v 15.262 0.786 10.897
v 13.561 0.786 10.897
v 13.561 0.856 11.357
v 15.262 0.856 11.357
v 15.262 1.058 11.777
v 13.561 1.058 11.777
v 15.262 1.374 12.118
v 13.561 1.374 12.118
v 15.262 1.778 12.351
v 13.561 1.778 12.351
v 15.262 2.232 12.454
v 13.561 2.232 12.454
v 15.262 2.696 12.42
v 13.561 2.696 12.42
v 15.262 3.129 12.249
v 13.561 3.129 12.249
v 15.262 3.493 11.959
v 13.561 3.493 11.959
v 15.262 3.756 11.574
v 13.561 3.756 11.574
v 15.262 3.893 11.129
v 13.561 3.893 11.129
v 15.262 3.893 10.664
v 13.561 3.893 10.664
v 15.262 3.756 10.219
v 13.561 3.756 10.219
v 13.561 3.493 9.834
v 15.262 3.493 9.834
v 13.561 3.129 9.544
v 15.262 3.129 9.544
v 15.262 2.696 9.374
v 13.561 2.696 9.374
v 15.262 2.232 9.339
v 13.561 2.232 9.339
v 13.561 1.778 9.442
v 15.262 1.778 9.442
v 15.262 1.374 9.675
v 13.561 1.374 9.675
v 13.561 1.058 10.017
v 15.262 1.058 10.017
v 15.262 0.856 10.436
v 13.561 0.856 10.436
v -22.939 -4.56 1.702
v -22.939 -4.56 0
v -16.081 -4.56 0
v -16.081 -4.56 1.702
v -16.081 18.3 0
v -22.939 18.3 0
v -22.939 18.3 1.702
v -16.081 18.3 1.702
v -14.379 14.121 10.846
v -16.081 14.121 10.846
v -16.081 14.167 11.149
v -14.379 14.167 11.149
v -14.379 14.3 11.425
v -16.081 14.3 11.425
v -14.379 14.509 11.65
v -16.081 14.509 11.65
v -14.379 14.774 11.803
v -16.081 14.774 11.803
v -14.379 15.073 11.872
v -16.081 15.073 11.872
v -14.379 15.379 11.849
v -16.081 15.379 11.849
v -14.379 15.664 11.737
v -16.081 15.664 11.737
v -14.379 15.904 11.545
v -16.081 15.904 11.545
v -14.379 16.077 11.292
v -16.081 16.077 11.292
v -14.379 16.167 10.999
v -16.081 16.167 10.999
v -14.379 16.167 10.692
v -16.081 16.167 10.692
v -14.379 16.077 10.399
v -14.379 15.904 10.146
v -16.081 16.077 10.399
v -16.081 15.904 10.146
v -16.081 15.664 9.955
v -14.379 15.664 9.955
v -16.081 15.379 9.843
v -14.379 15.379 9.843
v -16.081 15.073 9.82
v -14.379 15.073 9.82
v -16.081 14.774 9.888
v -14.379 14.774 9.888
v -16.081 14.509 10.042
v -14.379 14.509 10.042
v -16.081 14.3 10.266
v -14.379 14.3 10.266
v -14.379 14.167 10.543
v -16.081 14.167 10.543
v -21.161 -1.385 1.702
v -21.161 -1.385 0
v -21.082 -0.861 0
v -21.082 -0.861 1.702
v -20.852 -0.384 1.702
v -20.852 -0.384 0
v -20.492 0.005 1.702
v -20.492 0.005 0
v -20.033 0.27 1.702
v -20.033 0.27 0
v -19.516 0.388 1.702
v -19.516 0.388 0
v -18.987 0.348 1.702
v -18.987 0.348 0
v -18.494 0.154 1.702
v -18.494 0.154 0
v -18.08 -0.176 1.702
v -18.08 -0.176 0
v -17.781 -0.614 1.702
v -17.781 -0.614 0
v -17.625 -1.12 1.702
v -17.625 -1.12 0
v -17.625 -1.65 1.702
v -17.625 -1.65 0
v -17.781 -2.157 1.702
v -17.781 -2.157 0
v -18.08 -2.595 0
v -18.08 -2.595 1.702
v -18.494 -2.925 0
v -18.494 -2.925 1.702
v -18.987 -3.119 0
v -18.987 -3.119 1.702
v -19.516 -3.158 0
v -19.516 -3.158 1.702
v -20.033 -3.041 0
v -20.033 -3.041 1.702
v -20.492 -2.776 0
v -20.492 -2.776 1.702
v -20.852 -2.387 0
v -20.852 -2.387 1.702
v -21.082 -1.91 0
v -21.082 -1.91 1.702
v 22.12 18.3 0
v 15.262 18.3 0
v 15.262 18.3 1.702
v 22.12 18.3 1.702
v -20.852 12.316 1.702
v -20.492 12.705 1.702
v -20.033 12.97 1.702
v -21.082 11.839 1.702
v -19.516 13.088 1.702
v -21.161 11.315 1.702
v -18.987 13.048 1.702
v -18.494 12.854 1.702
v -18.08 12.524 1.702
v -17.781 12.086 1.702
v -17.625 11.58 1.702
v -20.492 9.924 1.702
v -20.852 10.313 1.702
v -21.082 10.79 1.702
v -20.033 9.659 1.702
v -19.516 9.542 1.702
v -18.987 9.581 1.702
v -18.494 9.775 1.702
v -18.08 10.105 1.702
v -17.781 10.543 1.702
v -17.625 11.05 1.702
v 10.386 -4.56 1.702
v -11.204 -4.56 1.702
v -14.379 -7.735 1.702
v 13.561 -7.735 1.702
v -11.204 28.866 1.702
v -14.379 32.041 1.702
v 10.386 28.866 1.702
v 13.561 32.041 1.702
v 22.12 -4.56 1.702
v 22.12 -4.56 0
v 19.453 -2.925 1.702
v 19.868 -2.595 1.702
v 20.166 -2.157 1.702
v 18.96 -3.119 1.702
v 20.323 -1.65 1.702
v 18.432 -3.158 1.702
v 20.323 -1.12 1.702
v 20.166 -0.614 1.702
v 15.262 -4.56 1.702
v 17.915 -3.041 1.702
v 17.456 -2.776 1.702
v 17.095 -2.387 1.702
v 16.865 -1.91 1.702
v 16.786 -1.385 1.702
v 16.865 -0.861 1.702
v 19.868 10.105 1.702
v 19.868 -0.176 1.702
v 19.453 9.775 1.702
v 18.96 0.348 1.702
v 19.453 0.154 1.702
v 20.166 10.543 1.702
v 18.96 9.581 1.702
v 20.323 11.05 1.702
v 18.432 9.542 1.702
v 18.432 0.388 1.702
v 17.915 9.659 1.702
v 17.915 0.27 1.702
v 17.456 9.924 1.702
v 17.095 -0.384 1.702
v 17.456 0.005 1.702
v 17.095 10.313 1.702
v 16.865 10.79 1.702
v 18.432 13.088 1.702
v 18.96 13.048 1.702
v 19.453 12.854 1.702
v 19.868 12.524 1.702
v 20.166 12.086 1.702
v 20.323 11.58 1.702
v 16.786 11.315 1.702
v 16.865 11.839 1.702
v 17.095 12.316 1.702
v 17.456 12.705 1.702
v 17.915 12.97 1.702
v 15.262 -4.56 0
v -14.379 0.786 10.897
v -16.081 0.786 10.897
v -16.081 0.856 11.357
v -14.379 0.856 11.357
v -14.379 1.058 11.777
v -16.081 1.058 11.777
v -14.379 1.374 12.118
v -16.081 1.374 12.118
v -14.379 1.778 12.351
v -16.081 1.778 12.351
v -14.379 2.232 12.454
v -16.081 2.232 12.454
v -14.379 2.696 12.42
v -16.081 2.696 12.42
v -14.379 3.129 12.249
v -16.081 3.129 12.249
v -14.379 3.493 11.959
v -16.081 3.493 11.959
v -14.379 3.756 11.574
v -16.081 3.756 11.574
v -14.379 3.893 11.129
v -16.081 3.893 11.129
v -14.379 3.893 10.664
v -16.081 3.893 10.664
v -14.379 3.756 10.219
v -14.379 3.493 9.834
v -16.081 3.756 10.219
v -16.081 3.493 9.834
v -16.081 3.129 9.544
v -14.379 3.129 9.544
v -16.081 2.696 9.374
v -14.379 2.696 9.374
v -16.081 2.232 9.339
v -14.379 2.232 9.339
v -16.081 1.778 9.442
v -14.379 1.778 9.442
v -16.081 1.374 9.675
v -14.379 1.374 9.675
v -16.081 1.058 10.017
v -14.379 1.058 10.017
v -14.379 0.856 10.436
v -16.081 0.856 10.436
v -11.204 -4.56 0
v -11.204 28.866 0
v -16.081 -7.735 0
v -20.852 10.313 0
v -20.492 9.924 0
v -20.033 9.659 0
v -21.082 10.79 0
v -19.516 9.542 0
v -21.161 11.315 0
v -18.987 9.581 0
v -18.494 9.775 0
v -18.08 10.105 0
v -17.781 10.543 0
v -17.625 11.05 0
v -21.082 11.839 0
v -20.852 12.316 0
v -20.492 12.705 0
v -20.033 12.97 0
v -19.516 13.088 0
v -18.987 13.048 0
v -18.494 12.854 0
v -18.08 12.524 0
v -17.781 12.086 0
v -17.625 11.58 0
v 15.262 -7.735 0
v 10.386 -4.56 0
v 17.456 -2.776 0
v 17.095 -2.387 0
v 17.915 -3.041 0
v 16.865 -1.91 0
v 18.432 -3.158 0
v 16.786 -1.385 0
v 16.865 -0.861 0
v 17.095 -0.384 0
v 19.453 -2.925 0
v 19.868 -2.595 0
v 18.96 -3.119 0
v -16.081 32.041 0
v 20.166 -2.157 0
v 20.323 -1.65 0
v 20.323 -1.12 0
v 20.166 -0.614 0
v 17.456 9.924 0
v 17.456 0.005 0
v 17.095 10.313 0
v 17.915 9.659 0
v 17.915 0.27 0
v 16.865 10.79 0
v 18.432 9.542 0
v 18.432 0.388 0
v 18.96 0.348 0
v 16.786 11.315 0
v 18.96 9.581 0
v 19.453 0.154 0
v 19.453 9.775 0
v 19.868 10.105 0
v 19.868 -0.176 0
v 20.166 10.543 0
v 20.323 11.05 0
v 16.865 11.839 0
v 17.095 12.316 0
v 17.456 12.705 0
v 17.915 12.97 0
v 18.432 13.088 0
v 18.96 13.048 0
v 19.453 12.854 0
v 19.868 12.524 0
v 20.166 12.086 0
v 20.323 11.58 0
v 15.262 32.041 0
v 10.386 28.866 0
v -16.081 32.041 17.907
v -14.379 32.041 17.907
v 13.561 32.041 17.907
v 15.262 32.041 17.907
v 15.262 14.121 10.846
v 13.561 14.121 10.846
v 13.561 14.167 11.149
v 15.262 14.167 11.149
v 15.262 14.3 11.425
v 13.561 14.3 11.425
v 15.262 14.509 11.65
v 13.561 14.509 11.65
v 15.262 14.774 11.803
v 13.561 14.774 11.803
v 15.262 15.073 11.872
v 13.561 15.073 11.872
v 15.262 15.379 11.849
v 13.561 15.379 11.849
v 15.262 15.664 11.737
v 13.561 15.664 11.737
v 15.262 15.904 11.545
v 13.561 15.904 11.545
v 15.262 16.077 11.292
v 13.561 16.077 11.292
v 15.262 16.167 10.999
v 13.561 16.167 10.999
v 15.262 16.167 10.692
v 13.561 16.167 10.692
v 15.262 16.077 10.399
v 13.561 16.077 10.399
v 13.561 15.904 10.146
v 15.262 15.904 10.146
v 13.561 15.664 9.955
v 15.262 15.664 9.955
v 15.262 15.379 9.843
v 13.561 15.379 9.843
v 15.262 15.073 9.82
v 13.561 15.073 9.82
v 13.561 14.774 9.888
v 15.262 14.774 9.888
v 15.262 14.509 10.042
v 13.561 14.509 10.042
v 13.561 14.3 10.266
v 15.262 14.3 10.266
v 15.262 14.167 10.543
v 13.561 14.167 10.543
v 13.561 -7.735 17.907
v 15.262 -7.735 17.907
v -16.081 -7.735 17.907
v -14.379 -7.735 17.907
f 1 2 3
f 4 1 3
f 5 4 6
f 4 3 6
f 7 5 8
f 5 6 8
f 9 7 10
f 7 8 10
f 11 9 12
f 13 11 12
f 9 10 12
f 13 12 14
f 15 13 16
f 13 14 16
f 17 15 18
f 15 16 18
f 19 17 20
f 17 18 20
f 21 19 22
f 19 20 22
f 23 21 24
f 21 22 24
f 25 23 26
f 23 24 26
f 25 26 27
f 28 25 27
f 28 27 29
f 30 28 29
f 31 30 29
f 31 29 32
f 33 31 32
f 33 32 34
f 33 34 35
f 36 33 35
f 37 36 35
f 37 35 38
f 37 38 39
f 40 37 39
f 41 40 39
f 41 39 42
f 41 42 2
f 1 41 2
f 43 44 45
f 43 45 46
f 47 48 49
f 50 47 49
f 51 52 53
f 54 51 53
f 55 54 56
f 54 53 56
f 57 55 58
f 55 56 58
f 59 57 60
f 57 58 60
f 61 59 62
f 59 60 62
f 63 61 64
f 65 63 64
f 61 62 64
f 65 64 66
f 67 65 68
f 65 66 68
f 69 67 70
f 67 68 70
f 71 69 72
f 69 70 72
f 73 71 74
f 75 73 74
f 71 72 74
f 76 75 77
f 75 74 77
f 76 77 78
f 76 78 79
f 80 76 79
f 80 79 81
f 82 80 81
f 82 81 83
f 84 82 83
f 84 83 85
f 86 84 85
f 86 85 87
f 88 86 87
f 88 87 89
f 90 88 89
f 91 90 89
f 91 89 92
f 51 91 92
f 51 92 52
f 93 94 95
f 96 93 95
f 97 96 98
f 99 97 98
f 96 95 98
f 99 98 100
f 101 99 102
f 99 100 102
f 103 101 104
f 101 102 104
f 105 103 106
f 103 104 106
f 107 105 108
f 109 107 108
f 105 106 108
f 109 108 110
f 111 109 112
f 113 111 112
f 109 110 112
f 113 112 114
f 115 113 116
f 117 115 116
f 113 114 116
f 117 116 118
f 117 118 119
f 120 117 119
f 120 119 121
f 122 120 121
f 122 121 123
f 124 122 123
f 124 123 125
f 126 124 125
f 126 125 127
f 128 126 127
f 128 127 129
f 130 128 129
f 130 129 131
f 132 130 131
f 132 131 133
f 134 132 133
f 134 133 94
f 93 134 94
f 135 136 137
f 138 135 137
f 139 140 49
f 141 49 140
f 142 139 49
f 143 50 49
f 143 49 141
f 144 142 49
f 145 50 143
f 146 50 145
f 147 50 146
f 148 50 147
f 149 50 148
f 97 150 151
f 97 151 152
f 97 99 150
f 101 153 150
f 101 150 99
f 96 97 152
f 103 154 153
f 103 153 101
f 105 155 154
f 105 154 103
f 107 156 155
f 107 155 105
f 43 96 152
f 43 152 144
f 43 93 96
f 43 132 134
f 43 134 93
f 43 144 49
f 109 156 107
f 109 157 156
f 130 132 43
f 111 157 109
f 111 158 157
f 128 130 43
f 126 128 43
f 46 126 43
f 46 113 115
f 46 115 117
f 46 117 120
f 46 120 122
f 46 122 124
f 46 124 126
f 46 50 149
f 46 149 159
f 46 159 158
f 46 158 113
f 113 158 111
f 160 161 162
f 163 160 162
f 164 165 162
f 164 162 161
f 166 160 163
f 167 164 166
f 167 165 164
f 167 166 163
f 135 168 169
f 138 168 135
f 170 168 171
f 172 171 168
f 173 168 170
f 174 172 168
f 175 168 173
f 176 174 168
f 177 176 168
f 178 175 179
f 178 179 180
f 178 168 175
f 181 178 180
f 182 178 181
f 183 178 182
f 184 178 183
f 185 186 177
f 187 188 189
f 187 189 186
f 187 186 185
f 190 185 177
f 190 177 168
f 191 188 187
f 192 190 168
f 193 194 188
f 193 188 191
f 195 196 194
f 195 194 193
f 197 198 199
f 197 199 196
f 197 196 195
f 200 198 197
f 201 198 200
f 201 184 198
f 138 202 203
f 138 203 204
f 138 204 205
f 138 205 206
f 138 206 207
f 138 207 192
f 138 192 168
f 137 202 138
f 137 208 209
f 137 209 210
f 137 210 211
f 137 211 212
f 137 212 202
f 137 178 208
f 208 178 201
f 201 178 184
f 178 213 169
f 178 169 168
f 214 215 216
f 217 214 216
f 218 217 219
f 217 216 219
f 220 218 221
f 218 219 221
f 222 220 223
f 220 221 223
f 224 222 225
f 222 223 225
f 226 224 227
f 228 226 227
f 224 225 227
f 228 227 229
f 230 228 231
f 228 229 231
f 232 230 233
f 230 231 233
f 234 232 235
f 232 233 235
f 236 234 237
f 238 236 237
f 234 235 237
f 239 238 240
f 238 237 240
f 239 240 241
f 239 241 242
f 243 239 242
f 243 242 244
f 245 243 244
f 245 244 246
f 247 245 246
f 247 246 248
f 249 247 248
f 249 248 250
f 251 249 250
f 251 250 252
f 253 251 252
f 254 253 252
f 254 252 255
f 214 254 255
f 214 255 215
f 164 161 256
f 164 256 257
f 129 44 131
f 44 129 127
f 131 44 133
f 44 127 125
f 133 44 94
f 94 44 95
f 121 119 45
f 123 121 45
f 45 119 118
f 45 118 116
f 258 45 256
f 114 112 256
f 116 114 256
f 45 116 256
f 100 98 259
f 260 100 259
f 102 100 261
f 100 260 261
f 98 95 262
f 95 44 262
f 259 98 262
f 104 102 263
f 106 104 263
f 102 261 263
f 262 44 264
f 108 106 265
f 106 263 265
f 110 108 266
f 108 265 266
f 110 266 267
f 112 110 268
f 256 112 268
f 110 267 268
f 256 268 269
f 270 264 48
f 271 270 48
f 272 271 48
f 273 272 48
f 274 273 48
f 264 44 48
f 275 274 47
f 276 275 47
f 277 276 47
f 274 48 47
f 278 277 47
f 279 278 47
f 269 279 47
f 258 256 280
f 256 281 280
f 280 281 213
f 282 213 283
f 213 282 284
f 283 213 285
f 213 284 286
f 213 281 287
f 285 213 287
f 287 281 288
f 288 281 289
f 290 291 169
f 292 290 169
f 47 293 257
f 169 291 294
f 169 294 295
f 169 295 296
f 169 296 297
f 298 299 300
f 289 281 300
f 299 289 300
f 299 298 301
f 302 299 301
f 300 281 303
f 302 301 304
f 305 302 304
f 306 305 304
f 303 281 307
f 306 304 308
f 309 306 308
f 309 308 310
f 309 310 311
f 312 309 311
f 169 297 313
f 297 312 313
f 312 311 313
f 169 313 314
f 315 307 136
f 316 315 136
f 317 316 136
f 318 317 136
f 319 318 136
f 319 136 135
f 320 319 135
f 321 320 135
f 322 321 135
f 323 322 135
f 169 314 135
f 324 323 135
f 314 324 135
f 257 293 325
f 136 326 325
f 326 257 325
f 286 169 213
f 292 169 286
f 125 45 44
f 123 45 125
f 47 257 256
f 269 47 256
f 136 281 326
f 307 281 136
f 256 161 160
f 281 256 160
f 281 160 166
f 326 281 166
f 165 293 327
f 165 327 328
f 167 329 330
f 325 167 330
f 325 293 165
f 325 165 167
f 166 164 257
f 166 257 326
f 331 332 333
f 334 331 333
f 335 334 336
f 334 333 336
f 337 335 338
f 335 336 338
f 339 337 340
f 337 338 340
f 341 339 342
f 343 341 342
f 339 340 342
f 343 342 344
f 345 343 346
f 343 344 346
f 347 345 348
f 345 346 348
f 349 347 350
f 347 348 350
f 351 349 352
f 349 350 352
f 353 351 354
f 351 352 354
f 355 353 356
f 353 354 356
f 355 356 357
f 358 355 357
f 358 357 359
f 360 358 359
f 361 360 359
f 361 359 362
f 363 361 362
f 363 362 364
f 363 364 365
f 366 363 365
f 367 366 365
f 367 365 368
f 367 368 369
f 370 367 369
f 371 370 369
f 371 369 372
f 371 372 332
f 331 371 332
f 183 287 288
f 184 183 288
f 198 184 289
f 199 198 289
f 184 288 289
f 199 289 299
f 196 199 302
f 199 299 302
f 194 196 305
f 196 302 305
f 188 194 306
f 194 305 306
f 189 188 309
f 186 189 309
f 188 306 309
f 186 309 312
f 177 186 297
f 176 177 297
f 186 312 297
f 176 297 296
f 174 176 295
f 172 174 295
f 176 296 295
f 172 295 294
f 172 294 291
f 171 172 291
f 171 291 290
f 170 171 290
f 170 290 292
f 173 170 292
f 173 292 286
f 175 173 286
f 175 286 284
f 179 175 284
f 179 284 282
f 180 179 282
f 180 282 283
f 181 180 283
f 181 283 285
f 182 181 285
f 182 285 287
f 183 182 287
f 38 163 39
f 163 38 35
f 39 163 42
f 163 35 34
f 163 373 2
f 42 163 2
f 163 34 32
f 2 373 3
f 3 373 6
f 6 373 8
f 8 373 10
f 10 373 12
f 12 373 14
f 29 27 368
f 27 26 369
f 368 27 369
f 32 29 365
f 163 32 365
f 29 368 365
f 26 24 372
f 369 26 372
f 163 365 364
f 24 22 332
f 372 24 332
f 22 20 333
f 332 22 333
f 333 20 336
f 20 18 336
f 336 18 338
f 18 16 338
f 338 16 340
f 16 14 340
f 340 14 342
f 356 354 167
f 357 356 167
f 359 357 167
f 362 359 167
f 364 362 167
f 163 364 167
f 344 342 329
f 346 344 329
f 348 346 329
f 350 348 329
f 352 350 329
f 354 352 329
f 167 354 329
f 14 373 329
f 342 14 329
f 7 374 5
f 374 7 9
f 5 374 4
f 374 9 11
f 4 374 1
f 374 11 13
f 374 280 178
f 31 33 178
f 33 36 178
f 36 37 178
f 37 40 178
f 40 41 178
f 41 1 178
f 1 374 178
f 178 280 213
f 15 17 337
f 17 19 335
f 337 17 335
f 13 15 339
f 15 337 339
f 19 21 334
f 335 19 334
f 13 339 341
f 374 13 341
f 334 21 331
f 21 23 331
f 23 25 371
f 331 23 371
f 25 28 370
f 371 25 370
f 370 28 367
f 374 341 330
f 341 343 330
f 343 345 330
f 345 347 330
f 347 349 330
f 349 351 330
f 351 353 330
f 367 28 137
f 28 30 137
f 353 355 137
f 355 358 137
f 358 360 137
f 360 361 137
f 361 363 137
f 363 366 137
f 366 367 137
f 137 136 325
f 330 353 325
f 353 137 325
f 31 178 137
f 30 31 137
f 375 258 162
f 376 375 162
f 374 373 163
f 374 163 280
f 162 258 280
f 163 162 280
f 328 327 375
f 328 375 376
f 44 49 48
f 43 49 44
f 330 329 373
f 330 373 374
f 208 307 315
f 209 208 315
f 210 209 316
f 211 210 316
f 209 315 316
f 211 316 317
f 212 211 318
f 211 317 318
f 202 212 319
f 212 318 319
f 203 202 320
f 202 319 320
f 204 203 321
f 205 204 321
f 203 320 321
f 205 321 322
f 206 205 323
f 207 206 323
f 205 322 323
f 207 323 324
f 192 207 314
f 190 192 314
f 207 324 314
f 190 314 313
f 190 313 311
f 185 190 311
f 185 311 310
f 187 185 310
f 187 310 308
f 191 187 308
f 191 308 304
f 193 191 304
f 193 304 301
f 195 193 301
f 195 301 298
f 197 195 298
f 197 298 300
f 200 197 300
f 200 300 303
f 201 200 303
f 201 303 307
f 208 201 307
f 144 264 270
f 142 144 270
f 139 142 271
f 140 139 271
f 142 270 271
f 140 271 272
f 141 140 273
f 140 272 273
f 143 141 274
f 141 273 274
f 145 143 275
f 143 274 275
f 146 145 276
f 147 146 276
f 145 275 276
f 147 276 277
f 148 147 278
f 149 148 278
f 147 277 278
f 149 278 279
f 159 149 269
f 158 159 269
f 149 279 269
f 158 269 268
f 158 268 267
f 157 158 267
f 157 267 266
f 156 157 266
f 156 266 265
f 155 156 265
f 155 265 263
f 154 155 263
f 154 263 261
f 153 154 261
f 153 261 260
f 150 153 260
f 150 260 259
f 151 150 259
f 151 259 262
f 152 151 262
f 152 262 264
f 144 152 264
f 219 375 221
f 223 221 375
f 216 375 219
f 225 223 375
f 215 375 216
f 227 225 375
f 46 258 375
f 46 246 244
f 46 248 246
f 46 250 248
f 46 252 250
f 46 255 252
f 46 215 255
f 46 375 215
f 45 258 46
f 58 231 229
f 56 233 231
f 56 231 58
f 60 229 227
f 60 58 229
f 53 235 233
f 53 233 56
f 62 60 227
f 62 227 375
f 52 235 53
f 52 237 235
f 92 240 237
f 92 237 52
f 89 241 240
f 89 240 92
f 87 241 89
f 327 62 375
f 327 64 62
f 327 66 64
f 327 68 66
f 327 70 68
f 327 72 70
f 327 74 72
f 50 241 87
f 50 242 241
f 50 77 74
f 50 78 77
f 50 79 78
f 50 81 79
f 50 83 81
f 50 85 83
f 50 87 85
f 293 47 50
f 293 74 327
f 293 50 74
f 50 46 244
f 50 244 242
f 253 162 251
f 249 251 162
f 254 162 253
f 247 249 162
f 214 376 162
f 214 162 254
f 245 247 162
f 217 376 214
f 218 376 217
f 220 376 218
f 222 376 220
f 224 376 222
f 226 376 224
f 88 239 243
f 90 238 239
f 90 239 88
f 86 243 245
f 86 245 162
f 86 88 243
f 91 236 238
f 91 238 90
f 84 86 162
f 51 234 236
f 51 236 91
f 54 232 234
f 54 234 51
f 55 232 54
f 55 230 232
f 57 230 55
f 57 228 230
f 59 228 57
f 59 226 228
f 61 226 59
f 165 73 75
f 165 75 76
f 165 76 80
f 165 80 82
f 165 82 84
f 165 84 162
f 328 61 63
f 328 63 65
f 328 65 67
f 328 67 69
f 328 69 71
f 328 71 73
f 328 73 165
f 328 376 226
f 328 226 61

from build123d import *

# Parameters (mm, degrees)
F0_W      = 31.3436
F0_H      = 39.7764
F1_DEPTH  = 17.907
F2_W      = 27.94
F2_H      = 39.7764
F3_DEPTH  = 16.2052
F4_W      = 22.86
F4_H      = 1.7018
F5_DEPTH  = 6.858
F6_W      = 22.86
F6_H      = 1.7018
F7_DEPTH  = 6.858
F9_D      = 3.556
F11_D     = 3.1242
F13_D     = 2.0574
F14_W     = 21.59
F14_H     = 33.4264
F15_DEPTH = 25.4


with BuildPart() as f1:
    # F0 (on Top) → F1 (new body)
    with BuildSketch(Plane.XY):
        with Locations((-0.4093366692, 12.1527582612)):
            Rectangle(F0_W, F0_H)
    extrude(amount=F1_DEPTH)

    # F2 (on face) → F3 (cut)
    with BuildSketch(Plane.XY.offset(17.907)):
        with Locations((-0.4093366692, 12.1527582612)):
            Rectangle(F2_W, F2_H)
    extrude(amount=-F3_DEPTH, mode=Mode.SUBTRACT)

    # F4 (on face) → F5 (join)
    with BuildSketch(Plane(origin=(-16.0811366692, 0, 0), x_dir=(0, -1, 0), z_dir=(-1, 0, 0))):
        with Locations((-6.8695582612, 0.8509)):
            Rectangle(F4_W, F4_H)
    extrude(amount=F5_DEPTH)

    # F6 (on face) → F7 (join)
    with BuildSketch(Plane.YZ.offset(15.2624633308)):
        with Locations((6.8695582612, 0.8509)):
            Rectangle(F6_W, F6_H)
    extrude(amount=F7_DEPTH)

    # F9 (through all)
    with Locations(Plane.XY.offset(1.7018)):
        with Locations((-19.3831366692, -1.3854417388), (18.5644633308, -1.3854417388), (18.5644633308, 11.3145582612), (-19.3831366692, 11.3145582612)):
            Hole(F9_D / 2)

    # F11 (through all)
    with Locations(Plane.YZ.offset(15.2624633308)):
        with Locations((2.3483582612, 10.8966)):
            Hole(F11_D / 2)

    # F13 (through all)
    with Locations(Plane.YZ.offset(15.2624633308)):
        with Locations((15.1499590679, 10.8458)):
            Hole(F13_D / 2)

    # F14 (on face) → F15 (cut)
    with BuildSketch(Plane.XY.offset(1.7018)):
        with Locations((-0.4093366692, 12.1527582612)):
            Rectangle(F14_W, F14_H)
    extrude(amount=-F15_DEPTH, mode=Mode.SUBTRACT)


solid = f1.part
